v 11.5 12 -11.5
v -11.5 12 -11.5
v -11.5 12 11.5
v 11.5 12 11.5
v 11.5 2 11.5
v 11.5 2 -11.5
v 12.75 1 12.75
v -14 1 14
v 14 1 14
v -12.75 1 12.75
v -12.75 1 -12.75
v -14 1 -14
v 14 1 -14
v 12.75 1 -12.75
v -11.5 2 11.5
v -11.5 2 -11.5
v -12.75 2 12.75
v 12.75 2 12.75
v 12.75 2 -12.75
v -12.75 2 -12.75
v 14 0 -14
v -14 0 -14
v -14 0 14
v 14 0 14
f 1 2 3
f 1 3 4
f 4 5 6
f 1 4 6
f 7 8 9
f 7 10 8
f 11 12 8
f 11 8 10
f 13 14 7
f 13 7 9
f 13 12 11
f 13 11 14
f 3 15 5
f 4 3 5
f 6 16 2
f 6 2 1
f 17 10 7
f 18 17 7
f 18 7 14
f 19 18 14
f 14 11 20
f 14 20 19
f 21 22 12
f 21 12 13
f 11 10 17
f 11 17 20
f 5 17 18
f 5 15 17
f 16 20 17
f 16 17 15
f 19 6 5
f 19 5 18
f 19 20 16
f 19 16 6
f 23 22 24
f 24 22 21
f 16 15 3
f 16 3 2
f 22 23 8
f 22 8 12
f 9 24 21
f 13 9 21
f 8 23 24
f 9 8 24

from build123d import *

# Parameters (mm, degrees)
SKETCH1_W           = 28
SKETCH1_H           = 28
BOSS_EXTRUDE1_DEPTH = 1
SKETCH2_W           = 25.5
SKETCH2_H           = 25.5
BOSS_EXTRUDE2_DEPTH = 1
SKETCH3_W           = 23
SKETCH3_H           = 23
BOSS_EXTRUDE3_DEPTH = 10


with BuildPart() as part:
    # Sketch1 → Boss-Extrude1 (new body)
    with BuildSketch(Plane(origin=(0, 0, 0), x_dir=(1, 0, 0), z_dir=(0, 1, 0))):
        Rectangle(SKETCH1_W, SKETCH1_H)
    extrude(amount=BOSS_EXTRUDE1_DEPTH)

    # Sketch2 → Boss-Extrude2 (add)
    with BuildSketch(Plane(origin=(0, 1, 0), x_dir=(1, 0, 0), z_dir=(0, 1, 0))):
        Rectangle(SKETCH2_W, SKETCH2_H)
    extrude(amount=BOSS_EXTRUDE2_DEPTH)

    # Sketch3 → Boss-Extrude3 (add)
    with BuildSketch(Plane(origin=(0, 2, 0), x_dir=(1, 0, 0), z_dir=(0, 1, 0))):
        Rectangle(SKETCH3_W, SKETCH3_H)
    extrude(amount=BOSS_EXTRUDE3_DEPTH)


solid = part.part
